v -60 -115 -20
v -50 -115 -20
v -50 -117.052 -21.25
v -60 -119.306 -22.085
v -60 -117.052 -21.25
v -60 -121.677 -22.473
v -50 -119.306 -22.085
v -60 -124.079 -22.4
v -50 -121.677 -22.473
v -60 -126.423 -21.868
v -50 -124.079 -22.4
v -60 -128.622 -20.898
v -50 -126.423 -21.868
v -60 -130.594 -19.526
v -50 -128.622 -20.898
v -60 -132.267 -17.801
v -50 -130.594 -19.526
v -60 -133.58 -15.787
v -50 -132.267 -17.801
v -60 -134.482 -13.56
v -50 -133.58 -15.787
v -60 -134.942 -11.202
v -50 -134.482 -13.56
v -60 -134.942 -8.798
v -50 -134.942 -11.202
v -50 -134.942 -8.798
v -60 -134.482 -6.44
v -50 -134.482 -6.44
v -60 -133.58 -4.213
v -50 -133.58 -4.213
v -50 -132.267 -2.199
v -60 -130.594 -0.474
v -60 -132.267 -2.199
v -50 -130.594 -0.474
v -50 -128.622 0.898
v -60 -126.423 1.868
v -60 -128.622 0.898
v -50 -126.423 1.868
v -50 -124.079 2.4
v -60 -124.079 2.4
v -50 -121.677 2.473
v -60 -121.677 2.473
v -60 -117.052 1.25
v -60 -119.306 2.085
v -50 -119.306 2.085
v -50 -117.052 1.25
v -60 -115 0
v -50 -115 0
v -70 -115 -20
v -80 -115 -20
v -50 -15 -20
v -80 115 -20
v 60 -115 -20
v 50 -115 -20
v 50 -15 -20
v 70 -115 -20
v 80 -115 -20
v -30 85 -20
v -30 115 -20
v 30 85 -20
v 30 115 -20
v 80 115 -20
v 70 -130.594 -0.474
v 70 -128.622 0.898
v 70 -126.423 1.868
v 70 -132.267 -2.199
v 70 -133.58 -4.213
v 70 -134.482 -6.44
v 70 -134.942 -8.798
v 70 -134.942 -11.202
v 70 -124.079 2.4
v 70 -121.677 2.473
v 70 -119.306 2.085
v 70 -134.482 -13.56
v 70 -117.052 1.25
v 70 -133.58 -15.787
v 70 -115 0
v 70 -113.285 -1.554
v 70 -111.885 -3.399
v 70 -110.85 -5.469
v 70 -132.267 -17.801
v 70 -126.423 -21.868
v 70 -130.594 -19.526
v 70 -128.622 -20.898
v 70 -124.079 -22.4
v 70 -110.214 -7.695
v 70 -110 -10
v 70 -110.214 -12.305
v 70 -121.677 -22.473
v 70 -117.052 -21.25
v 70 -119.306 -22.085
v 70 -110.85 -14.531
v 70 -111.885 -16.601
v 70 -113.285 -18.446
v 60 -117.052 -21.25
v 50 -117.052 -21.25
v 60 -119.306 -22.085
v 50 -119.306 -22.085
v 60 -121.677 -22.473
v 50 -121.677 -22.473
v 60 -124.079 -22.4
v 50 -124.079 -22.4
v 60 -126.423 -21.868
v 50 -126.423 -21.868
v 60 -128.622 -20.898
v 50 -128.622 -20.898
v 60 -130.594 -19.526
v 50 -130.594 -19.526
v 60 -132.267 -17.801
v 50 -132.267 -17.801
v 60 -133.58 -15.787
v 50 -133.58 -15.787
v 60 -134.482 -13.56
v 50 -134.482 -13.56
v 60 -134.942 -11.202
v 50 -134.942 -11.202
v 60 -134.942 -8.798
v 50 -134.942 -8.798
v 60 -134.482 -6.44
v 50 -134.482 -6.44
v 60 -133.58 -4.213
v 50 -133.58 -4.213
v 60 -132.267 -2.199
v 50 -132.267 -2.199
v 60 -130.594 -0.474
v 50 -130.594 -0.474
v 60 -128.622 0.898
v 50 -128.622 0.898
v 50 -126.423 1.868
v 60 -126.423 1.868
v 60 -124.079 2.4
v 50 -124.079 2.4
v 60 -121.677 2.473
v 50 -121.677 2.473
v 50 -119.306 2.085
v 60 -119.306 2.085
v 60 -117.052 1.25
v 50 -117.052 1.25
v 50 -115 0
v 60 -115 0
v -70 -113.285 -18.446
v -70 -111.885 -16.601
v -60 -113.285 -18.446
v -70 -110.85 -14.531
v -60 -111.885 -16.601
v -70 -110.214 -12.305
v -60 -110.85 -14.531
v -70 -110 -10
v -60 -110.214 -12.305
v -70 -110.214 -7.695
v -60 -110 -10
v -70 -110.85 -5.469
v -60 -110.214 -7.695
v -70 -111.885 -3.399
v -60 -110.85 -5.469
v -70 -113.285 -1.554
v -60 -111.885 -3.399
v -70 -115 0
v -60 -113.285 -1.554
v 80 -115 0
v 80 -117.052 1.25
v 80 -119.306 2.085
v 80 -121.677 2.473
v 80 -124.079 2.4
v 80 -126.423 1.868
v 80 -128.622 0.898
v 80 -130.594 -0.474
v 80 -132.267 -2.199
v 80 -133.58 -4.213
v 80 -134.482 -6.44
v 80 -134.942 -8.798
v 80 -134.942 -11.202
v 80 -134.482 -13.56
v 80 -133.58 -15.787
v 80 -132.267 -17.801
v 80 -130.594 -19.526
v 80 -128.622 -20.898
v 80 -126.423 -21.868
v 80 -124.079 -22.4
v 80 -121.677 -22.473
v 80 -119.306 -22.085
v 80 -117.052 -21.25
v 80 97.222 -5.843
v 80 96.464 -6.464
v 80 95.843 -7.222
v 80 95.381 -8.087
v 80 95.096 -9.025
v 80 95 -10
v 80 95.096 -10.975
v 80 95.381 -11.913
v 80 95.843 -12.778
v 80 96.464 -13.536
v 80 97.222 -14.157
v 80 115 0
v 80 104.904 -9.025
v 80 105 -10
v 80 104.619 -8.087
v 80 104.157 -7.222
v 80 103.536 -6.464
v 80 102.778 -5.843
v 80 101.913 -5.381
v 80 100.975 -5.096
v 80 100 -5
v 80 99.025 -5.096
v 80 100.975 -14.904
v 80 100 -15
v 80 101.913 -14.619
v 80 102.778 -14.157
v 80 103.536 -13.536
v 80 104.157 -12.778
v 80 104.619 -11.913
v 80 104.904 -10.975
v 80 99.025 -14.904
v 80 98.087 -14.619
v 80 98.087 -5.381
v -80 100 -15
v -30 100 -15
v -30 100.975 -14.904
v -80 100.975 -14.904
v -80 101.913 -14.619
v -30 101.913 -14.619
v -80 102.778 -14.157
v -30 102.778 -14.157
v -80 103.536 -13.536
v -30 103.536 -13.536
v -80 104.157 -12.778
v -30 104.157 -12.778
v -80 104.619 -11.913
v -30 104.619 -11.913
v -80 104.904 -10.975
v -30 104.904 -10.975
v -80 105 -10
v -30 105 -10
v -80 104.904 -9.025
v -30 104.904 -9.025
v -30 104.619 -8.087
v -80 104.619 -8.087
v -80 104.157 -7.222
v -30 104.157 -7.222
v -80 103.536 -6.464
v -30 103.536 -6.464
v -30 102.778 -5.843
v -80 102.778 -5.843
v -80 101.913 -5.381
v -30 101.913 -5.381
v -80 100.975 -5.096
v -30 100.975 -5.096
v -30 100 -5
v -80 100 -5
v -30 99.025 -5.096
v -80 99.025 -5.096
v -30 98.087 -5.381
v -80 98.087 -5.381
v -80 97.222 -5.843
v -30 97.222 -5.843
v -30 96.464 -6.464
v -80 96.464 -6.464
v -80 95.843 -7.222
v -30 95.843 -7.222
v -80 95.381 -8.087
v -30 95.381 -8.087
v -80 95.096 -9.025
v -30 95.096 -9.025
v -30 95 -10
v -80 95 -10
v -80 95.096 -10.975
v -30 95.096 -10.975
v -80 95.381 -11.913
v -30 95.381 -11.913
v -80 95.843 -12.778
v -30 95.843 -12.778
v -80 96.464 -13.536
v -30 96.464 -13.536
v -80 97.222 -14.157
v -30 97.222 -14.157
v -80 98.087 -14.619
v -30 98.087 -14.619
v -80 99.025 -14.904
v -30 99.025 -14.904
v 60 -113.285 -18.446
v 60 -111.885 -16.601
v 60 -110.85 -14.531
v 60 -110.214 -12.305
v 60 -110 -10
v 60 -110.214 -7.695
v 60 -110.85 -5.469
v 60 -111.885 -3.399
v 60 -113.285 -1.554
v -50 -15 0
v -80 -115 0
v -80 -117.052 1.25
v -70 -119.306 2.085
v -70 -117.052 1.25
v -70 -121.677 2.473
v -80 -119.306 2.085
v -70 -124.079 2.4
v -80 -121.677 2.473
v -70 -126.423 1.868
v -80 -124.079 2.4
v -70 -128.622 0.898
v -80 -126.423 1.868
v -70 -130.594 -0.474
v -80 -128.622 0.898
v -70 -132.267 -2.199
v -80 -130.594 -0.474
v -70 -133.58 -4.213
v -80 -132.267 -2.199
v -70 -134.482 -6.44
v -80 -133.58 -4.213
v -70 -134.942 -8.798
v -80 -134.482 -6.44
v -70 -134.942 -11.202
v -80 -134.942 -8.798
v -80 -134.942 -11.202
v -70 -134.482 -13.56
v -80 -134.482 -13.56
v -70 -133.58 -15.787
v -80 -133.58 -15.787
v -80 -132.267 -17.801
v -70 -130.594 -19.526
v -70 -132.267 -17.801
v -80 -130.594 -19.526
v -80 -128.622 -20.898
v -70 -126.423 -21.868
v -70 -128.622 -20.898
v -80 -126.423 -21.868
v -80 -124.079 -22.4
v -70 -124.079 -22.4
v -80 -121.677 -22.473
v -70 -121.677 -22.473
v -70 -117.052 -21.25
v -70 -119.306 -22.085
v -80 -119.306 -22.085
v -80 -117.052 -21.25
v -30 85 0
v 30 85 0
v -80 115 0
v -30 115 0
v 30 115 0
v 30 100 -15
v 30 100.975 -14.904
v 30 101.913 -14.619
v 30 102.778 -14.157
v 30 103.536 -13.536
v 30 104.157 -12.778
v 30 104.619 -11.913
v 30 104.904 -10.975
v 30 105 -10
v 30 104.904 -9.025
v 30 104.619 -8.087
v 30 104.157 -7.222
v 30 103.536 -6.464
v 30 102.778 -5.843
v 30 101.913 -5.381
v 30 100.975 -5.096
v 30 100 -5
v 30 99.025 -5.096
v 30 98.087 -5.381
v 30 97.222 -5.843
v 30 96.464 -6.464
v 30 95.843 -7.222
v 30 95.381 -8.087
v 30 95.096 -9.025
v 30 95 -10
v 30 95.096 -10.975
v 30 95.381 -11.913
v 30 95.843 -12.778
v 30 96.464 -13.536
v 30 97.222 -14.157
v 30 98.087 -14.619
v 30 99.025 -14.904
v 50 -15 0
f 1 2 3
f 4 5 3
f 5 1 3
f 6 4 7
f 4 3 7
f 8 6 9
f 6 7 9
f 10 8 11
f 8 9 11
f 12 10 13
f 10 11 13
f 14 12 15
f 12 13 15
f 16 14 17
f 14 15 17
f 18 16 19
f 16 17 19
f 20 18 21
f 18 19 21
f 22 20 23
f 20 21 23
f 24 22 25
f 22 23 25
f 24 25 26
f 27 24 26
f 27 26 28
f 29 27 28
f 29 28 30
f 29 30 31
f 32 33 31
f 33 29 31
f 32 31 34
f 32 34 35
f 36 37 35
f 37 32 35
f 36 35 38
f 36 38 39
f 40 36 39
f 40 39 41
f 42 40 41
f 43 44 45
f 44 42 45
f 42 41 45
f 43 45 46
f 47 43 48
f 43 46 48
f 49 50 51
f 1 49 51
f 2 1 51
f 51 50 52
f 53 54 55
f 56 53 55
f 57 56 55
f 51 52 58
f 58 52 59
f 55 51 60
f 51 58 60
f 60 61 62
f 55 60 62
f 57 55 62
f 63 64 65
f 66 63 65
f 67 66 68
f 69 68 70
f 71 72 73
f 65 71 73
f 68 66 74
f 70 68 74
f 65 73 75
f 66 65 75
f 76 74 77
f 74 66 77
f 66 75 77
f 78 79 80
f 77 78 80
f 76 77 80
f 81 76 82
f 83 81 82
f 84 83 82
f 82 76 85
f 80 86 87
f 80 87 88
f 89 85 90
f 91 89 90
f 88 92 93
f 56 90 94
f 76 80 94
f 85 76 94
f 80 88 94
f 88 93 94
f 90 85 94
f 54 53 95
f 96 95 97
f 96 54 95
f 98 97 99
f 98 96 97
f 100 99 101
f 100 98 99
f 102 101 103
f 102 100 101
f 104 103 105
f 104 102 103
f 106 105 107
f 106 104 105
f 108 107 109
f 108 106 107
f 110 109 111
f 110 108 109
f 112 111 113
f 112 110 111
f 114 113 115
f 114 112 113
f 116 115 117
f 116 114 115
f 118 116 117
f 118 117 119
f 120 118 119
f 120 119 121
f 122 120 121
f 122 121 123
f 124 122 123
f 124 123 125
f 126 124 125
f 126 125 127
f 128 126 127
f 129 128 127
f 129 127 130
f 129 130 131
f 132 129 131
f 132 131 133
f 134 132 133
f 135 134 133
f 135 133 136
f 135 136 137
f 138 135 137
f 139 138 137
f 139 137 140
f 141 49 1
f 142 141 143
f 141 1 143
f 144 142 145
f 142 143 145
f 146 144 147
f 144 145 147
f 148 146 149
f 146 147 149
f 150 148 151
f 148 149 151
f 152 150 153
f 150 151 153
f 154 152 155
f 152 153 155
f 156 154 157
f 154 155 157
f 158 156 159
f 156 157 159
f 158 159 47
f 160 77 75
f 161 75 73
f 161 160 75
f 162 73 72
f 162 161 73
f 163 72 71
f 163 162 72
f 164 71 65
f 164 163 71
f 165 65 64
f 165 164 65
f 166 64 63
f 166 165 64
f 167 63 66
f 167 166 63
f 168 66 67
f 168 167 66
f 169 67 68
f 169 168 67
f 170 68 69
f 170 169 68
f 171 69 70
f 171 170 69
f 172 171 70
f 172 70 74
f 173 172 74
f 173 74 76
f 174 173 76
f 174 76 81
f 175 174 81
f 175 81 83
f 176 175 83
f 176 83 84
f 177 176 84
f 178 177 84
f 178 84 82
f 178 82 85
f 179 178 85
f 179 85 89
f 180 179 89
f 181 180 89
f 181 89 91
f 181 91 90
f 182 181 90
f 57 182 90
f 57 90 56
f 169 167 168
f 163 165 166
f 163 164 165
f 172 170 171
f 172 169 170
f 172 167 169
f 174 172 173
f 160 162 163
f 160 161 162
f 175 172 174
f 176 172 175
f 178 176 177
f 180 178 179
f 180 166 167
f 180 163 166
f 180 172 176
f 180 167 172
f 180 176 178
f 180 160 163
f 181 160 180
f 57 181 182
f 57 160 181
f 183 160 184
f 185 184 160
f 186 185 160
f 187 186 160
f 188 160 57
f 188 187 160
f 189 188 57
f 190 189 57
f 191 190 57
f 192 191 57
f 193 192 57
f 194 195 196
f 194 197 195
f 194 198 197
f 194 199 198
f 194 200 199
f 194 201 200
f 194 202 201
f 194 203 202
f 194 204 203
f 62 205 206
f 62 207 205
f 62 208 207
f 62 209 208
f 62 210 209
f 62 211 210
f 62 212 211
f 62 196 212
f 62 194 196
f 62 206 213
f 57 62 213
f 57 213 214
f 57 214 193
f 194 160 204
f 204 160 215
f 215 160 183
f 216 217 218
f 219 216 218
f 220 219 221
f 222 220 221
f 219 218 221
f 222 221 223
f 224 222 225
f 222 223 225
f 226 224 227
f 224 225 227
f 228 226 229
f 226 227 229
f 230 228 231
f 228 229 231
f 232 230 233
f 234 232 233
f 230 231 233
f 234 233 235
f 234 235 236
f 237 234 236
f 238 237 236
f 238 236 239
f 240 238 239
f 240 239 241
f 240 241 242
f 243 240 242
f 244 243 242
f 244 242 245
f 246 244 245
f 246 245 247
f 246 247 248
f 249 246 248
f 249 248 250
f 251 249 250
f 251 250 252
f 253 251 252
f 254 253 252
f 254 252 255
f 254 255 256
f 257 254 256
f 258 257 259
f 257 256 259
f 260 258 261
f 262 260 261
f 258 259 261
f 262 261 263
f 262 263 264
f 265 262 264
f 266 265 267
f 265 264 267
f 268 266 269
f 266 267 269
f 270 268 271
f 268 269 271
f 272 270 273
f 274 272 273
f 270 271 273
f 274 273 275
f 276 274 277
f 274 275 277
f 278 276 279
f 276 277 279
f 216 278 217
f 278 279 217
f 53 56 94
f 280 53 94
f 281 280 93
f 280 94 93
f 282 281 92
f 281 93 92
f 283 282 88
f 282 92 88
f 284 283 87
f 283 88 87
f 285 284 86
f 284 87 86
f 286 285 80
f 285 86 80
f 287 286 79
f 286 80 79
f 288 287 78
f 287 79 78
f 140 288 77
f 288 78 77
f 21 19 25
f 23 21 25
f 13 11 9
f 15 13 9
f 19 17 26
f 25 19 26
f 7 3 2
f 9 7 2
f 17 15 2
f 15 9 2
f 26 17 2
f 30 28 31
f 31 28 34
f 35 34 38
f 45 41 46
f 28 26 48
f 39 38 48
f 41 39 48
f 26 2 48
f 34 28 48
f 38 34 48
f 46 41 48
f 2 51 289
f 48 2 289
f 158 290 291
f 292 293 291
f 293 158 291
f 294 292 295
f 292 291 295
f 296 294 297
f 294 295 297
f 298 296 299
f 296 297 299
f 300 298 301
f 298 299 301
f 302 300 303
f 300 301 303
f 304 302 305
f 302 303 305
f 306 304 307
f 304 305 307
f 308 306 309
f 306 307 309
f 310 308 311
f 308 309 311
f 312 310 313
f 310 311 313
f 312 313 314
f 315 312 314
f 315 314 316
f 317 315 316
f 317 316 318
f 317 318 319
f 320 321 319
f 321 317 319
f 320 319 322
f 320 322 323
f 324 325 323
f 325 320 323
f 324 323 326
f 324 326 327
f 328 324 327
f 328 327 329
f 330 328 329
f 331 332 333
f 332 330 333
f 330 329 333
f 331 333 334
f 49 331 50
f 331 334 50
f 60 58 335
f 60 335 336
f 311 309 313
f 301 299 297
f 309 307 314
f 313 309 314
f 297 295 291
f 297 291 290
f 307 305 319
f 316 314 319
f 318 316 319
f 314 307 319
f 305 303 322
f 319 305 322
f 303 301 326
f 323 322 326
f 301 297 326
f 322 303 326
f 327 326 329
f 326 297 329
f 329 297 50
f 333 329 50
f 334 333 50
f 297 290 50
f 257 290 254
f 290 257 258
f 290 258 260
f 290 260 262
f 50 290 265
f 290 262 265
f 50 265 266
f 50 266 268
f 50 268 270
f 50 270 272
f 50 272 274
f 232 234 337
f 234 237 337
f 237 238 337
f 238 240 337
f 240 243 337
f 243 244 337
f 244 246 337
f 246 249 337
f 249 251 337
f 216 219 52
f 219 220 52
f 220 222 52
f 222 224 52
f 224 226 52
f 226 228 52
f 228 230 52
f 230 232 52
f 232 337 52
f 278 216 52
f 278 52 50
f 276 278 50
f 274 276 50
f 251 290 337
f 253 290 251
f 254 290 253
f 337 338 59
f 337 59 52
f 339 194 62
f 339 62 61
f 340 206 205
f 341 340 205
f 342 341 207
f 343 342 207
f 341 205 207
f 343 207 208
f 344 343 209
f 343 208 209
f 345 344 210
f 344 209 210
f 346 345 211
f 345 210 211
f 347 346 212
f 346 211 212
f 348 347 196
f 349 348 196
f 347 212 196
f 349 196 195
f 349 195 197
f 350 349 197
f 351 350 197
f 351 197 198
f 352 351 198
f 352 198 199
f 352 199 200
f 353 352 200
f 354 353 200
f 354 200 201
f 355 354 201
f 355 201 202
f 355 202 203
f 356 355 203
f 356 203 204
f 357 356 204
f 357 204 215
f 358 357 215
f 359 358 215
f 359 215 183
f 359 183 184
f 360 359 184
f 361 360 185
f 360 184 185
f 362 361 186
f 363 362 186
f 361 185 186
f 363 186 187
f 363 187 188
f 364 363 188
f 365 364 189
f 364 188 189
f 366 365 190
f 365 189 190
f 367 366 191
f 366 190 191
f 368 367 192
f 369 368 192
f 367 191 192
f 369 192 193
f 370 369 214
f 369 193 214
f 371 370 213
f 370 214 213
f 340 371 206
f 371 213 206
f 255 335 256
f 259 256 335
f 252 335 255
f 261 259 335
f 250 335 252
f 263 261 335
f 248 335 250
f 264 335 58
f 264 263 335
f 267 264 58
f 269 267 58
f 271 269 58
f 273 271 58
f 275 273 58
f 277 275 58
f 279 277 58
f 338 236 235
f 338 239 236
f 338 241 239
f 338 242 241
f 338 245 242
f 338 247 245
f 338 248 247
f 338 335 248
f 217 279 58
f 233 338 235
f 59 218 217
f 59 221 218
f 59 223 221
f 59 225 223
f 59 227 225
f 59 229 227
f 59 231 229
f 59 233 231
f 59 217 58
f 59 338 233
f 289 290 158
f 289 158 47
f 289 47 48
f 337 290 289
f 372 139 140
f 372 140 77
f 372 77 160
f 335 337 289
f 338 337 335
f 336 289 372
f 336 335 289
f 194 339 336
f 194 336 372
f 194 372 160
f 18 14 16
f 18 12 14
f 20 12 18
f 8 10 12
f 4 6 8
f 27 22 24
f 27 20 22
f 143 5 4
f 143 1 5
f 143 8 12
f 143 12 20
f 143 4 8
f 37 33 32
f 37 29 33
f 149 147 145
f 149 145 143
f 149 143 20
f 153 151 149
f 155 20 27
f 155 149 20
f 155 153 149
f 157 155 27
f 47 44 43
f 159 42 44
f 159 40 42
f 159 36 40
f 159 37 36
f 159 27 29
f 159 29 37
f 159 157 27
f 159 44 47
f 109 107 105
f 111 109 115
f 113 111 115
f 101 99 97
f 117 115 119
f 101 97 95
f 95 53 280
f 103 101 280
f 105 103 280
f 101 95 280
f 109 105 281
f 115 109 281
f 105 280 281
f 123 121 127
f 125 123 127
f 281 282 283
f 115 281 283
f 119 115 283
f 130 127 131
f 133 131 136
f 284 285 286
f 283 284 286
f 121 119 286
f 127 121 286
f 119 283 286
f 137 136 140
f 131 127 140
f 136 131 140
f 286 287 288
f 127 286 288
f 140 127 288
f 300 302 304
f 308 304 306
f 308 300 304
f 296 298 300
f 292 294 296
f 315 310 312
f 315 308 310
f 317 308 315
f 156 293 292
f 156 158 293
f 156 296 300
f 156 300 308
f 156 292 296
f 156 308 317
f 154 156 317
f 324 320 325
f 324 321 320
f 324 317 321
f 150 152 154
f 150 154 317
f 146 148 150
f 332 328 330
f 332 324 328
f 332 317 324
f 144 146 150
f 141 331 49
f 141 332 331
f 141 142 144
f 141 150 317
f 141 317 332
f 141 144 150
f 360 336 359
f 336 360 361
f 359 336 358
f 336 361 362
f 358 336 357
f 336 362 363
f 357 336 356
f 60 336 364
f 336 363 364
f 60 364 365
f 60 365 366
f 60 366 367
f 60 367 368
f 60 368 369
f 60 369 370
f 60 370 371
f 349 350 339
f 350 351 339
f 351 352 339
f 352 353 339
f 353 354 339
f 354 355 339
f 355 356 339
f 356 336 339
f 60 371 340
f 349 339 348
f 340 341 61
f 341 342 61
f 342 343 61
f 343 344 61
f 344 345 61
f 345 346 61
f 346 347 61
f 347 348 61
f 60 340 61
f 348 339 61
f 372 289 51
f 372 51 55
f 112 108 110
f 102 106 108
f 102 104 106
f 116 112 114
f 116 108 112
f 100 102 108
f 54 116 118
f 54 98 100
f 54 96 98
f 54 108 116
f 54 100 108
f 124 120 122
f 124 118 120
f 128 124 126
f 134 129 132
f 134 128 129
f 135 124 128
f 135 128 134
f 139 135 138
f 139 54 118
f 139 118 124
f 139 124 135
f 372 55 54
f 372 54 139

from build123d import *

# Parameters (mm, degrees)
BOSS_EXTRUDE2_DEPTH = 20
SKETCH2_R           = 12.5
CUT_EXTRUDE1_DEPTH  = 80
SKETCH3_R           = 12.5
BOSS_EXTRUDE3_DEPTH = 10
SKETCH4_R           = 12.5
BOSS_EXTRUDE4_DEPTH = 10
CUT_EXTRUDE2_REACH  = 162
SKETCH5_R           = 5
SKETCH6_W           = 60
SKETCH6_H           = 20
CUT_EXTRUDE3_DEPTH  = 30


with BuildPart() as part:
    # Sketch1 → Boss-Extrude2 (new body)
    with BuildSketch(Plane.XY):
        Polygon((50, -115), (80, -115), (80, 115), (-80, 115), (-80, -115), (-50, -115), (-50, -15), (50, -15), align=None)
    extrude(amount=-BOSS_EXTRUDE2_DEPTH)

    # Sketch2 → Cut-Extrude1 (cut, symmetric)
    with BuildSketch(Plane(origin=(0, 0, 0), x_dir=(0, 0, -1), z_dir=(1, 0, 0))):
        with Locations((10, -122.5)):
            Circle(SKETCH2_R)
    extrude(amount=CUT_EXTRUDE1_DEPTH, both=True, mode=Mode.SUBTRACT)

    # Sketch3 → Boss-Extrude3 (add)
    with BuildSketch(Plane(origin=(80, 0, 0), x_dir=(0, 0, -1), z_dir=(1, 0, 0))):
        with Locations((10, -122.5)):
            Circle(SKETCH3_R)
    boss_extrude3 = extrude(amount=-BOSS_EXTRUDE3_DEPTH)

    # Mirror1: Boss-Extrude3 across plane
    add(boss_extrude3.mirror(Plane(origin=(0, 0, 0), x_dir=(0, 0, 1), z_dir=(1, 0, 0))))

    # Sketch4 → Boss-Extrude4 (add)
    with BuildSketch(Plane.ZY.offset(-50)):
        with Locations((-10, -122.5)):
            Circle(SKETCH4_R)
    boss_extrude4 = extrude(amount=-BOSS_EXTRUDE4_DEPTH)

    # Mirror2: Boss-Extrude4 across plane
    add(boss_extrude4.mirror(Plane(origin=(0, 0, 0), x_dir=(0, 0, 1), z_dir=(1, 0, 0))))

    # Sketch5 → Cut-Extrude2 (cut, up to next)
    with BuildSketch(Plane(origin=(80, 0, 0), x_dir=(0, 0, -1), z_dir=(1, 0, 0)), mode=Mode.PRIVATE) as cut_extrude2_sk1:
        with Locations((10, 100)):
            Circle(SKETCH5_R)
    cut_extrude2_tool1 = extrude(cut_extrude2_sk1.sketch, amount=-CUT_EXTRUDE2_REACH, mode=Mode.PRIVATE) & part.part
    add(cut_extrude2_tool1.solids().sort_by_distance((80, 100, -10))[0], mode=Mode.SUBTRACT)

    # Sketch6 → Cut-Extrude3 (cut)
    with BuildSketch(Plane(origin=(0, 115, 0), x_dir=(1, 0, 0), z_dir=(0, 1, 0))):
        with Locations((0, 10)):
            Rectangle(SKETCH6_W, SKETCH6_H)
    extrude(amount=-CUT_EXTRUDE3_DEPTH, mode=Mode.SUBTRACT)


solid = part.part
